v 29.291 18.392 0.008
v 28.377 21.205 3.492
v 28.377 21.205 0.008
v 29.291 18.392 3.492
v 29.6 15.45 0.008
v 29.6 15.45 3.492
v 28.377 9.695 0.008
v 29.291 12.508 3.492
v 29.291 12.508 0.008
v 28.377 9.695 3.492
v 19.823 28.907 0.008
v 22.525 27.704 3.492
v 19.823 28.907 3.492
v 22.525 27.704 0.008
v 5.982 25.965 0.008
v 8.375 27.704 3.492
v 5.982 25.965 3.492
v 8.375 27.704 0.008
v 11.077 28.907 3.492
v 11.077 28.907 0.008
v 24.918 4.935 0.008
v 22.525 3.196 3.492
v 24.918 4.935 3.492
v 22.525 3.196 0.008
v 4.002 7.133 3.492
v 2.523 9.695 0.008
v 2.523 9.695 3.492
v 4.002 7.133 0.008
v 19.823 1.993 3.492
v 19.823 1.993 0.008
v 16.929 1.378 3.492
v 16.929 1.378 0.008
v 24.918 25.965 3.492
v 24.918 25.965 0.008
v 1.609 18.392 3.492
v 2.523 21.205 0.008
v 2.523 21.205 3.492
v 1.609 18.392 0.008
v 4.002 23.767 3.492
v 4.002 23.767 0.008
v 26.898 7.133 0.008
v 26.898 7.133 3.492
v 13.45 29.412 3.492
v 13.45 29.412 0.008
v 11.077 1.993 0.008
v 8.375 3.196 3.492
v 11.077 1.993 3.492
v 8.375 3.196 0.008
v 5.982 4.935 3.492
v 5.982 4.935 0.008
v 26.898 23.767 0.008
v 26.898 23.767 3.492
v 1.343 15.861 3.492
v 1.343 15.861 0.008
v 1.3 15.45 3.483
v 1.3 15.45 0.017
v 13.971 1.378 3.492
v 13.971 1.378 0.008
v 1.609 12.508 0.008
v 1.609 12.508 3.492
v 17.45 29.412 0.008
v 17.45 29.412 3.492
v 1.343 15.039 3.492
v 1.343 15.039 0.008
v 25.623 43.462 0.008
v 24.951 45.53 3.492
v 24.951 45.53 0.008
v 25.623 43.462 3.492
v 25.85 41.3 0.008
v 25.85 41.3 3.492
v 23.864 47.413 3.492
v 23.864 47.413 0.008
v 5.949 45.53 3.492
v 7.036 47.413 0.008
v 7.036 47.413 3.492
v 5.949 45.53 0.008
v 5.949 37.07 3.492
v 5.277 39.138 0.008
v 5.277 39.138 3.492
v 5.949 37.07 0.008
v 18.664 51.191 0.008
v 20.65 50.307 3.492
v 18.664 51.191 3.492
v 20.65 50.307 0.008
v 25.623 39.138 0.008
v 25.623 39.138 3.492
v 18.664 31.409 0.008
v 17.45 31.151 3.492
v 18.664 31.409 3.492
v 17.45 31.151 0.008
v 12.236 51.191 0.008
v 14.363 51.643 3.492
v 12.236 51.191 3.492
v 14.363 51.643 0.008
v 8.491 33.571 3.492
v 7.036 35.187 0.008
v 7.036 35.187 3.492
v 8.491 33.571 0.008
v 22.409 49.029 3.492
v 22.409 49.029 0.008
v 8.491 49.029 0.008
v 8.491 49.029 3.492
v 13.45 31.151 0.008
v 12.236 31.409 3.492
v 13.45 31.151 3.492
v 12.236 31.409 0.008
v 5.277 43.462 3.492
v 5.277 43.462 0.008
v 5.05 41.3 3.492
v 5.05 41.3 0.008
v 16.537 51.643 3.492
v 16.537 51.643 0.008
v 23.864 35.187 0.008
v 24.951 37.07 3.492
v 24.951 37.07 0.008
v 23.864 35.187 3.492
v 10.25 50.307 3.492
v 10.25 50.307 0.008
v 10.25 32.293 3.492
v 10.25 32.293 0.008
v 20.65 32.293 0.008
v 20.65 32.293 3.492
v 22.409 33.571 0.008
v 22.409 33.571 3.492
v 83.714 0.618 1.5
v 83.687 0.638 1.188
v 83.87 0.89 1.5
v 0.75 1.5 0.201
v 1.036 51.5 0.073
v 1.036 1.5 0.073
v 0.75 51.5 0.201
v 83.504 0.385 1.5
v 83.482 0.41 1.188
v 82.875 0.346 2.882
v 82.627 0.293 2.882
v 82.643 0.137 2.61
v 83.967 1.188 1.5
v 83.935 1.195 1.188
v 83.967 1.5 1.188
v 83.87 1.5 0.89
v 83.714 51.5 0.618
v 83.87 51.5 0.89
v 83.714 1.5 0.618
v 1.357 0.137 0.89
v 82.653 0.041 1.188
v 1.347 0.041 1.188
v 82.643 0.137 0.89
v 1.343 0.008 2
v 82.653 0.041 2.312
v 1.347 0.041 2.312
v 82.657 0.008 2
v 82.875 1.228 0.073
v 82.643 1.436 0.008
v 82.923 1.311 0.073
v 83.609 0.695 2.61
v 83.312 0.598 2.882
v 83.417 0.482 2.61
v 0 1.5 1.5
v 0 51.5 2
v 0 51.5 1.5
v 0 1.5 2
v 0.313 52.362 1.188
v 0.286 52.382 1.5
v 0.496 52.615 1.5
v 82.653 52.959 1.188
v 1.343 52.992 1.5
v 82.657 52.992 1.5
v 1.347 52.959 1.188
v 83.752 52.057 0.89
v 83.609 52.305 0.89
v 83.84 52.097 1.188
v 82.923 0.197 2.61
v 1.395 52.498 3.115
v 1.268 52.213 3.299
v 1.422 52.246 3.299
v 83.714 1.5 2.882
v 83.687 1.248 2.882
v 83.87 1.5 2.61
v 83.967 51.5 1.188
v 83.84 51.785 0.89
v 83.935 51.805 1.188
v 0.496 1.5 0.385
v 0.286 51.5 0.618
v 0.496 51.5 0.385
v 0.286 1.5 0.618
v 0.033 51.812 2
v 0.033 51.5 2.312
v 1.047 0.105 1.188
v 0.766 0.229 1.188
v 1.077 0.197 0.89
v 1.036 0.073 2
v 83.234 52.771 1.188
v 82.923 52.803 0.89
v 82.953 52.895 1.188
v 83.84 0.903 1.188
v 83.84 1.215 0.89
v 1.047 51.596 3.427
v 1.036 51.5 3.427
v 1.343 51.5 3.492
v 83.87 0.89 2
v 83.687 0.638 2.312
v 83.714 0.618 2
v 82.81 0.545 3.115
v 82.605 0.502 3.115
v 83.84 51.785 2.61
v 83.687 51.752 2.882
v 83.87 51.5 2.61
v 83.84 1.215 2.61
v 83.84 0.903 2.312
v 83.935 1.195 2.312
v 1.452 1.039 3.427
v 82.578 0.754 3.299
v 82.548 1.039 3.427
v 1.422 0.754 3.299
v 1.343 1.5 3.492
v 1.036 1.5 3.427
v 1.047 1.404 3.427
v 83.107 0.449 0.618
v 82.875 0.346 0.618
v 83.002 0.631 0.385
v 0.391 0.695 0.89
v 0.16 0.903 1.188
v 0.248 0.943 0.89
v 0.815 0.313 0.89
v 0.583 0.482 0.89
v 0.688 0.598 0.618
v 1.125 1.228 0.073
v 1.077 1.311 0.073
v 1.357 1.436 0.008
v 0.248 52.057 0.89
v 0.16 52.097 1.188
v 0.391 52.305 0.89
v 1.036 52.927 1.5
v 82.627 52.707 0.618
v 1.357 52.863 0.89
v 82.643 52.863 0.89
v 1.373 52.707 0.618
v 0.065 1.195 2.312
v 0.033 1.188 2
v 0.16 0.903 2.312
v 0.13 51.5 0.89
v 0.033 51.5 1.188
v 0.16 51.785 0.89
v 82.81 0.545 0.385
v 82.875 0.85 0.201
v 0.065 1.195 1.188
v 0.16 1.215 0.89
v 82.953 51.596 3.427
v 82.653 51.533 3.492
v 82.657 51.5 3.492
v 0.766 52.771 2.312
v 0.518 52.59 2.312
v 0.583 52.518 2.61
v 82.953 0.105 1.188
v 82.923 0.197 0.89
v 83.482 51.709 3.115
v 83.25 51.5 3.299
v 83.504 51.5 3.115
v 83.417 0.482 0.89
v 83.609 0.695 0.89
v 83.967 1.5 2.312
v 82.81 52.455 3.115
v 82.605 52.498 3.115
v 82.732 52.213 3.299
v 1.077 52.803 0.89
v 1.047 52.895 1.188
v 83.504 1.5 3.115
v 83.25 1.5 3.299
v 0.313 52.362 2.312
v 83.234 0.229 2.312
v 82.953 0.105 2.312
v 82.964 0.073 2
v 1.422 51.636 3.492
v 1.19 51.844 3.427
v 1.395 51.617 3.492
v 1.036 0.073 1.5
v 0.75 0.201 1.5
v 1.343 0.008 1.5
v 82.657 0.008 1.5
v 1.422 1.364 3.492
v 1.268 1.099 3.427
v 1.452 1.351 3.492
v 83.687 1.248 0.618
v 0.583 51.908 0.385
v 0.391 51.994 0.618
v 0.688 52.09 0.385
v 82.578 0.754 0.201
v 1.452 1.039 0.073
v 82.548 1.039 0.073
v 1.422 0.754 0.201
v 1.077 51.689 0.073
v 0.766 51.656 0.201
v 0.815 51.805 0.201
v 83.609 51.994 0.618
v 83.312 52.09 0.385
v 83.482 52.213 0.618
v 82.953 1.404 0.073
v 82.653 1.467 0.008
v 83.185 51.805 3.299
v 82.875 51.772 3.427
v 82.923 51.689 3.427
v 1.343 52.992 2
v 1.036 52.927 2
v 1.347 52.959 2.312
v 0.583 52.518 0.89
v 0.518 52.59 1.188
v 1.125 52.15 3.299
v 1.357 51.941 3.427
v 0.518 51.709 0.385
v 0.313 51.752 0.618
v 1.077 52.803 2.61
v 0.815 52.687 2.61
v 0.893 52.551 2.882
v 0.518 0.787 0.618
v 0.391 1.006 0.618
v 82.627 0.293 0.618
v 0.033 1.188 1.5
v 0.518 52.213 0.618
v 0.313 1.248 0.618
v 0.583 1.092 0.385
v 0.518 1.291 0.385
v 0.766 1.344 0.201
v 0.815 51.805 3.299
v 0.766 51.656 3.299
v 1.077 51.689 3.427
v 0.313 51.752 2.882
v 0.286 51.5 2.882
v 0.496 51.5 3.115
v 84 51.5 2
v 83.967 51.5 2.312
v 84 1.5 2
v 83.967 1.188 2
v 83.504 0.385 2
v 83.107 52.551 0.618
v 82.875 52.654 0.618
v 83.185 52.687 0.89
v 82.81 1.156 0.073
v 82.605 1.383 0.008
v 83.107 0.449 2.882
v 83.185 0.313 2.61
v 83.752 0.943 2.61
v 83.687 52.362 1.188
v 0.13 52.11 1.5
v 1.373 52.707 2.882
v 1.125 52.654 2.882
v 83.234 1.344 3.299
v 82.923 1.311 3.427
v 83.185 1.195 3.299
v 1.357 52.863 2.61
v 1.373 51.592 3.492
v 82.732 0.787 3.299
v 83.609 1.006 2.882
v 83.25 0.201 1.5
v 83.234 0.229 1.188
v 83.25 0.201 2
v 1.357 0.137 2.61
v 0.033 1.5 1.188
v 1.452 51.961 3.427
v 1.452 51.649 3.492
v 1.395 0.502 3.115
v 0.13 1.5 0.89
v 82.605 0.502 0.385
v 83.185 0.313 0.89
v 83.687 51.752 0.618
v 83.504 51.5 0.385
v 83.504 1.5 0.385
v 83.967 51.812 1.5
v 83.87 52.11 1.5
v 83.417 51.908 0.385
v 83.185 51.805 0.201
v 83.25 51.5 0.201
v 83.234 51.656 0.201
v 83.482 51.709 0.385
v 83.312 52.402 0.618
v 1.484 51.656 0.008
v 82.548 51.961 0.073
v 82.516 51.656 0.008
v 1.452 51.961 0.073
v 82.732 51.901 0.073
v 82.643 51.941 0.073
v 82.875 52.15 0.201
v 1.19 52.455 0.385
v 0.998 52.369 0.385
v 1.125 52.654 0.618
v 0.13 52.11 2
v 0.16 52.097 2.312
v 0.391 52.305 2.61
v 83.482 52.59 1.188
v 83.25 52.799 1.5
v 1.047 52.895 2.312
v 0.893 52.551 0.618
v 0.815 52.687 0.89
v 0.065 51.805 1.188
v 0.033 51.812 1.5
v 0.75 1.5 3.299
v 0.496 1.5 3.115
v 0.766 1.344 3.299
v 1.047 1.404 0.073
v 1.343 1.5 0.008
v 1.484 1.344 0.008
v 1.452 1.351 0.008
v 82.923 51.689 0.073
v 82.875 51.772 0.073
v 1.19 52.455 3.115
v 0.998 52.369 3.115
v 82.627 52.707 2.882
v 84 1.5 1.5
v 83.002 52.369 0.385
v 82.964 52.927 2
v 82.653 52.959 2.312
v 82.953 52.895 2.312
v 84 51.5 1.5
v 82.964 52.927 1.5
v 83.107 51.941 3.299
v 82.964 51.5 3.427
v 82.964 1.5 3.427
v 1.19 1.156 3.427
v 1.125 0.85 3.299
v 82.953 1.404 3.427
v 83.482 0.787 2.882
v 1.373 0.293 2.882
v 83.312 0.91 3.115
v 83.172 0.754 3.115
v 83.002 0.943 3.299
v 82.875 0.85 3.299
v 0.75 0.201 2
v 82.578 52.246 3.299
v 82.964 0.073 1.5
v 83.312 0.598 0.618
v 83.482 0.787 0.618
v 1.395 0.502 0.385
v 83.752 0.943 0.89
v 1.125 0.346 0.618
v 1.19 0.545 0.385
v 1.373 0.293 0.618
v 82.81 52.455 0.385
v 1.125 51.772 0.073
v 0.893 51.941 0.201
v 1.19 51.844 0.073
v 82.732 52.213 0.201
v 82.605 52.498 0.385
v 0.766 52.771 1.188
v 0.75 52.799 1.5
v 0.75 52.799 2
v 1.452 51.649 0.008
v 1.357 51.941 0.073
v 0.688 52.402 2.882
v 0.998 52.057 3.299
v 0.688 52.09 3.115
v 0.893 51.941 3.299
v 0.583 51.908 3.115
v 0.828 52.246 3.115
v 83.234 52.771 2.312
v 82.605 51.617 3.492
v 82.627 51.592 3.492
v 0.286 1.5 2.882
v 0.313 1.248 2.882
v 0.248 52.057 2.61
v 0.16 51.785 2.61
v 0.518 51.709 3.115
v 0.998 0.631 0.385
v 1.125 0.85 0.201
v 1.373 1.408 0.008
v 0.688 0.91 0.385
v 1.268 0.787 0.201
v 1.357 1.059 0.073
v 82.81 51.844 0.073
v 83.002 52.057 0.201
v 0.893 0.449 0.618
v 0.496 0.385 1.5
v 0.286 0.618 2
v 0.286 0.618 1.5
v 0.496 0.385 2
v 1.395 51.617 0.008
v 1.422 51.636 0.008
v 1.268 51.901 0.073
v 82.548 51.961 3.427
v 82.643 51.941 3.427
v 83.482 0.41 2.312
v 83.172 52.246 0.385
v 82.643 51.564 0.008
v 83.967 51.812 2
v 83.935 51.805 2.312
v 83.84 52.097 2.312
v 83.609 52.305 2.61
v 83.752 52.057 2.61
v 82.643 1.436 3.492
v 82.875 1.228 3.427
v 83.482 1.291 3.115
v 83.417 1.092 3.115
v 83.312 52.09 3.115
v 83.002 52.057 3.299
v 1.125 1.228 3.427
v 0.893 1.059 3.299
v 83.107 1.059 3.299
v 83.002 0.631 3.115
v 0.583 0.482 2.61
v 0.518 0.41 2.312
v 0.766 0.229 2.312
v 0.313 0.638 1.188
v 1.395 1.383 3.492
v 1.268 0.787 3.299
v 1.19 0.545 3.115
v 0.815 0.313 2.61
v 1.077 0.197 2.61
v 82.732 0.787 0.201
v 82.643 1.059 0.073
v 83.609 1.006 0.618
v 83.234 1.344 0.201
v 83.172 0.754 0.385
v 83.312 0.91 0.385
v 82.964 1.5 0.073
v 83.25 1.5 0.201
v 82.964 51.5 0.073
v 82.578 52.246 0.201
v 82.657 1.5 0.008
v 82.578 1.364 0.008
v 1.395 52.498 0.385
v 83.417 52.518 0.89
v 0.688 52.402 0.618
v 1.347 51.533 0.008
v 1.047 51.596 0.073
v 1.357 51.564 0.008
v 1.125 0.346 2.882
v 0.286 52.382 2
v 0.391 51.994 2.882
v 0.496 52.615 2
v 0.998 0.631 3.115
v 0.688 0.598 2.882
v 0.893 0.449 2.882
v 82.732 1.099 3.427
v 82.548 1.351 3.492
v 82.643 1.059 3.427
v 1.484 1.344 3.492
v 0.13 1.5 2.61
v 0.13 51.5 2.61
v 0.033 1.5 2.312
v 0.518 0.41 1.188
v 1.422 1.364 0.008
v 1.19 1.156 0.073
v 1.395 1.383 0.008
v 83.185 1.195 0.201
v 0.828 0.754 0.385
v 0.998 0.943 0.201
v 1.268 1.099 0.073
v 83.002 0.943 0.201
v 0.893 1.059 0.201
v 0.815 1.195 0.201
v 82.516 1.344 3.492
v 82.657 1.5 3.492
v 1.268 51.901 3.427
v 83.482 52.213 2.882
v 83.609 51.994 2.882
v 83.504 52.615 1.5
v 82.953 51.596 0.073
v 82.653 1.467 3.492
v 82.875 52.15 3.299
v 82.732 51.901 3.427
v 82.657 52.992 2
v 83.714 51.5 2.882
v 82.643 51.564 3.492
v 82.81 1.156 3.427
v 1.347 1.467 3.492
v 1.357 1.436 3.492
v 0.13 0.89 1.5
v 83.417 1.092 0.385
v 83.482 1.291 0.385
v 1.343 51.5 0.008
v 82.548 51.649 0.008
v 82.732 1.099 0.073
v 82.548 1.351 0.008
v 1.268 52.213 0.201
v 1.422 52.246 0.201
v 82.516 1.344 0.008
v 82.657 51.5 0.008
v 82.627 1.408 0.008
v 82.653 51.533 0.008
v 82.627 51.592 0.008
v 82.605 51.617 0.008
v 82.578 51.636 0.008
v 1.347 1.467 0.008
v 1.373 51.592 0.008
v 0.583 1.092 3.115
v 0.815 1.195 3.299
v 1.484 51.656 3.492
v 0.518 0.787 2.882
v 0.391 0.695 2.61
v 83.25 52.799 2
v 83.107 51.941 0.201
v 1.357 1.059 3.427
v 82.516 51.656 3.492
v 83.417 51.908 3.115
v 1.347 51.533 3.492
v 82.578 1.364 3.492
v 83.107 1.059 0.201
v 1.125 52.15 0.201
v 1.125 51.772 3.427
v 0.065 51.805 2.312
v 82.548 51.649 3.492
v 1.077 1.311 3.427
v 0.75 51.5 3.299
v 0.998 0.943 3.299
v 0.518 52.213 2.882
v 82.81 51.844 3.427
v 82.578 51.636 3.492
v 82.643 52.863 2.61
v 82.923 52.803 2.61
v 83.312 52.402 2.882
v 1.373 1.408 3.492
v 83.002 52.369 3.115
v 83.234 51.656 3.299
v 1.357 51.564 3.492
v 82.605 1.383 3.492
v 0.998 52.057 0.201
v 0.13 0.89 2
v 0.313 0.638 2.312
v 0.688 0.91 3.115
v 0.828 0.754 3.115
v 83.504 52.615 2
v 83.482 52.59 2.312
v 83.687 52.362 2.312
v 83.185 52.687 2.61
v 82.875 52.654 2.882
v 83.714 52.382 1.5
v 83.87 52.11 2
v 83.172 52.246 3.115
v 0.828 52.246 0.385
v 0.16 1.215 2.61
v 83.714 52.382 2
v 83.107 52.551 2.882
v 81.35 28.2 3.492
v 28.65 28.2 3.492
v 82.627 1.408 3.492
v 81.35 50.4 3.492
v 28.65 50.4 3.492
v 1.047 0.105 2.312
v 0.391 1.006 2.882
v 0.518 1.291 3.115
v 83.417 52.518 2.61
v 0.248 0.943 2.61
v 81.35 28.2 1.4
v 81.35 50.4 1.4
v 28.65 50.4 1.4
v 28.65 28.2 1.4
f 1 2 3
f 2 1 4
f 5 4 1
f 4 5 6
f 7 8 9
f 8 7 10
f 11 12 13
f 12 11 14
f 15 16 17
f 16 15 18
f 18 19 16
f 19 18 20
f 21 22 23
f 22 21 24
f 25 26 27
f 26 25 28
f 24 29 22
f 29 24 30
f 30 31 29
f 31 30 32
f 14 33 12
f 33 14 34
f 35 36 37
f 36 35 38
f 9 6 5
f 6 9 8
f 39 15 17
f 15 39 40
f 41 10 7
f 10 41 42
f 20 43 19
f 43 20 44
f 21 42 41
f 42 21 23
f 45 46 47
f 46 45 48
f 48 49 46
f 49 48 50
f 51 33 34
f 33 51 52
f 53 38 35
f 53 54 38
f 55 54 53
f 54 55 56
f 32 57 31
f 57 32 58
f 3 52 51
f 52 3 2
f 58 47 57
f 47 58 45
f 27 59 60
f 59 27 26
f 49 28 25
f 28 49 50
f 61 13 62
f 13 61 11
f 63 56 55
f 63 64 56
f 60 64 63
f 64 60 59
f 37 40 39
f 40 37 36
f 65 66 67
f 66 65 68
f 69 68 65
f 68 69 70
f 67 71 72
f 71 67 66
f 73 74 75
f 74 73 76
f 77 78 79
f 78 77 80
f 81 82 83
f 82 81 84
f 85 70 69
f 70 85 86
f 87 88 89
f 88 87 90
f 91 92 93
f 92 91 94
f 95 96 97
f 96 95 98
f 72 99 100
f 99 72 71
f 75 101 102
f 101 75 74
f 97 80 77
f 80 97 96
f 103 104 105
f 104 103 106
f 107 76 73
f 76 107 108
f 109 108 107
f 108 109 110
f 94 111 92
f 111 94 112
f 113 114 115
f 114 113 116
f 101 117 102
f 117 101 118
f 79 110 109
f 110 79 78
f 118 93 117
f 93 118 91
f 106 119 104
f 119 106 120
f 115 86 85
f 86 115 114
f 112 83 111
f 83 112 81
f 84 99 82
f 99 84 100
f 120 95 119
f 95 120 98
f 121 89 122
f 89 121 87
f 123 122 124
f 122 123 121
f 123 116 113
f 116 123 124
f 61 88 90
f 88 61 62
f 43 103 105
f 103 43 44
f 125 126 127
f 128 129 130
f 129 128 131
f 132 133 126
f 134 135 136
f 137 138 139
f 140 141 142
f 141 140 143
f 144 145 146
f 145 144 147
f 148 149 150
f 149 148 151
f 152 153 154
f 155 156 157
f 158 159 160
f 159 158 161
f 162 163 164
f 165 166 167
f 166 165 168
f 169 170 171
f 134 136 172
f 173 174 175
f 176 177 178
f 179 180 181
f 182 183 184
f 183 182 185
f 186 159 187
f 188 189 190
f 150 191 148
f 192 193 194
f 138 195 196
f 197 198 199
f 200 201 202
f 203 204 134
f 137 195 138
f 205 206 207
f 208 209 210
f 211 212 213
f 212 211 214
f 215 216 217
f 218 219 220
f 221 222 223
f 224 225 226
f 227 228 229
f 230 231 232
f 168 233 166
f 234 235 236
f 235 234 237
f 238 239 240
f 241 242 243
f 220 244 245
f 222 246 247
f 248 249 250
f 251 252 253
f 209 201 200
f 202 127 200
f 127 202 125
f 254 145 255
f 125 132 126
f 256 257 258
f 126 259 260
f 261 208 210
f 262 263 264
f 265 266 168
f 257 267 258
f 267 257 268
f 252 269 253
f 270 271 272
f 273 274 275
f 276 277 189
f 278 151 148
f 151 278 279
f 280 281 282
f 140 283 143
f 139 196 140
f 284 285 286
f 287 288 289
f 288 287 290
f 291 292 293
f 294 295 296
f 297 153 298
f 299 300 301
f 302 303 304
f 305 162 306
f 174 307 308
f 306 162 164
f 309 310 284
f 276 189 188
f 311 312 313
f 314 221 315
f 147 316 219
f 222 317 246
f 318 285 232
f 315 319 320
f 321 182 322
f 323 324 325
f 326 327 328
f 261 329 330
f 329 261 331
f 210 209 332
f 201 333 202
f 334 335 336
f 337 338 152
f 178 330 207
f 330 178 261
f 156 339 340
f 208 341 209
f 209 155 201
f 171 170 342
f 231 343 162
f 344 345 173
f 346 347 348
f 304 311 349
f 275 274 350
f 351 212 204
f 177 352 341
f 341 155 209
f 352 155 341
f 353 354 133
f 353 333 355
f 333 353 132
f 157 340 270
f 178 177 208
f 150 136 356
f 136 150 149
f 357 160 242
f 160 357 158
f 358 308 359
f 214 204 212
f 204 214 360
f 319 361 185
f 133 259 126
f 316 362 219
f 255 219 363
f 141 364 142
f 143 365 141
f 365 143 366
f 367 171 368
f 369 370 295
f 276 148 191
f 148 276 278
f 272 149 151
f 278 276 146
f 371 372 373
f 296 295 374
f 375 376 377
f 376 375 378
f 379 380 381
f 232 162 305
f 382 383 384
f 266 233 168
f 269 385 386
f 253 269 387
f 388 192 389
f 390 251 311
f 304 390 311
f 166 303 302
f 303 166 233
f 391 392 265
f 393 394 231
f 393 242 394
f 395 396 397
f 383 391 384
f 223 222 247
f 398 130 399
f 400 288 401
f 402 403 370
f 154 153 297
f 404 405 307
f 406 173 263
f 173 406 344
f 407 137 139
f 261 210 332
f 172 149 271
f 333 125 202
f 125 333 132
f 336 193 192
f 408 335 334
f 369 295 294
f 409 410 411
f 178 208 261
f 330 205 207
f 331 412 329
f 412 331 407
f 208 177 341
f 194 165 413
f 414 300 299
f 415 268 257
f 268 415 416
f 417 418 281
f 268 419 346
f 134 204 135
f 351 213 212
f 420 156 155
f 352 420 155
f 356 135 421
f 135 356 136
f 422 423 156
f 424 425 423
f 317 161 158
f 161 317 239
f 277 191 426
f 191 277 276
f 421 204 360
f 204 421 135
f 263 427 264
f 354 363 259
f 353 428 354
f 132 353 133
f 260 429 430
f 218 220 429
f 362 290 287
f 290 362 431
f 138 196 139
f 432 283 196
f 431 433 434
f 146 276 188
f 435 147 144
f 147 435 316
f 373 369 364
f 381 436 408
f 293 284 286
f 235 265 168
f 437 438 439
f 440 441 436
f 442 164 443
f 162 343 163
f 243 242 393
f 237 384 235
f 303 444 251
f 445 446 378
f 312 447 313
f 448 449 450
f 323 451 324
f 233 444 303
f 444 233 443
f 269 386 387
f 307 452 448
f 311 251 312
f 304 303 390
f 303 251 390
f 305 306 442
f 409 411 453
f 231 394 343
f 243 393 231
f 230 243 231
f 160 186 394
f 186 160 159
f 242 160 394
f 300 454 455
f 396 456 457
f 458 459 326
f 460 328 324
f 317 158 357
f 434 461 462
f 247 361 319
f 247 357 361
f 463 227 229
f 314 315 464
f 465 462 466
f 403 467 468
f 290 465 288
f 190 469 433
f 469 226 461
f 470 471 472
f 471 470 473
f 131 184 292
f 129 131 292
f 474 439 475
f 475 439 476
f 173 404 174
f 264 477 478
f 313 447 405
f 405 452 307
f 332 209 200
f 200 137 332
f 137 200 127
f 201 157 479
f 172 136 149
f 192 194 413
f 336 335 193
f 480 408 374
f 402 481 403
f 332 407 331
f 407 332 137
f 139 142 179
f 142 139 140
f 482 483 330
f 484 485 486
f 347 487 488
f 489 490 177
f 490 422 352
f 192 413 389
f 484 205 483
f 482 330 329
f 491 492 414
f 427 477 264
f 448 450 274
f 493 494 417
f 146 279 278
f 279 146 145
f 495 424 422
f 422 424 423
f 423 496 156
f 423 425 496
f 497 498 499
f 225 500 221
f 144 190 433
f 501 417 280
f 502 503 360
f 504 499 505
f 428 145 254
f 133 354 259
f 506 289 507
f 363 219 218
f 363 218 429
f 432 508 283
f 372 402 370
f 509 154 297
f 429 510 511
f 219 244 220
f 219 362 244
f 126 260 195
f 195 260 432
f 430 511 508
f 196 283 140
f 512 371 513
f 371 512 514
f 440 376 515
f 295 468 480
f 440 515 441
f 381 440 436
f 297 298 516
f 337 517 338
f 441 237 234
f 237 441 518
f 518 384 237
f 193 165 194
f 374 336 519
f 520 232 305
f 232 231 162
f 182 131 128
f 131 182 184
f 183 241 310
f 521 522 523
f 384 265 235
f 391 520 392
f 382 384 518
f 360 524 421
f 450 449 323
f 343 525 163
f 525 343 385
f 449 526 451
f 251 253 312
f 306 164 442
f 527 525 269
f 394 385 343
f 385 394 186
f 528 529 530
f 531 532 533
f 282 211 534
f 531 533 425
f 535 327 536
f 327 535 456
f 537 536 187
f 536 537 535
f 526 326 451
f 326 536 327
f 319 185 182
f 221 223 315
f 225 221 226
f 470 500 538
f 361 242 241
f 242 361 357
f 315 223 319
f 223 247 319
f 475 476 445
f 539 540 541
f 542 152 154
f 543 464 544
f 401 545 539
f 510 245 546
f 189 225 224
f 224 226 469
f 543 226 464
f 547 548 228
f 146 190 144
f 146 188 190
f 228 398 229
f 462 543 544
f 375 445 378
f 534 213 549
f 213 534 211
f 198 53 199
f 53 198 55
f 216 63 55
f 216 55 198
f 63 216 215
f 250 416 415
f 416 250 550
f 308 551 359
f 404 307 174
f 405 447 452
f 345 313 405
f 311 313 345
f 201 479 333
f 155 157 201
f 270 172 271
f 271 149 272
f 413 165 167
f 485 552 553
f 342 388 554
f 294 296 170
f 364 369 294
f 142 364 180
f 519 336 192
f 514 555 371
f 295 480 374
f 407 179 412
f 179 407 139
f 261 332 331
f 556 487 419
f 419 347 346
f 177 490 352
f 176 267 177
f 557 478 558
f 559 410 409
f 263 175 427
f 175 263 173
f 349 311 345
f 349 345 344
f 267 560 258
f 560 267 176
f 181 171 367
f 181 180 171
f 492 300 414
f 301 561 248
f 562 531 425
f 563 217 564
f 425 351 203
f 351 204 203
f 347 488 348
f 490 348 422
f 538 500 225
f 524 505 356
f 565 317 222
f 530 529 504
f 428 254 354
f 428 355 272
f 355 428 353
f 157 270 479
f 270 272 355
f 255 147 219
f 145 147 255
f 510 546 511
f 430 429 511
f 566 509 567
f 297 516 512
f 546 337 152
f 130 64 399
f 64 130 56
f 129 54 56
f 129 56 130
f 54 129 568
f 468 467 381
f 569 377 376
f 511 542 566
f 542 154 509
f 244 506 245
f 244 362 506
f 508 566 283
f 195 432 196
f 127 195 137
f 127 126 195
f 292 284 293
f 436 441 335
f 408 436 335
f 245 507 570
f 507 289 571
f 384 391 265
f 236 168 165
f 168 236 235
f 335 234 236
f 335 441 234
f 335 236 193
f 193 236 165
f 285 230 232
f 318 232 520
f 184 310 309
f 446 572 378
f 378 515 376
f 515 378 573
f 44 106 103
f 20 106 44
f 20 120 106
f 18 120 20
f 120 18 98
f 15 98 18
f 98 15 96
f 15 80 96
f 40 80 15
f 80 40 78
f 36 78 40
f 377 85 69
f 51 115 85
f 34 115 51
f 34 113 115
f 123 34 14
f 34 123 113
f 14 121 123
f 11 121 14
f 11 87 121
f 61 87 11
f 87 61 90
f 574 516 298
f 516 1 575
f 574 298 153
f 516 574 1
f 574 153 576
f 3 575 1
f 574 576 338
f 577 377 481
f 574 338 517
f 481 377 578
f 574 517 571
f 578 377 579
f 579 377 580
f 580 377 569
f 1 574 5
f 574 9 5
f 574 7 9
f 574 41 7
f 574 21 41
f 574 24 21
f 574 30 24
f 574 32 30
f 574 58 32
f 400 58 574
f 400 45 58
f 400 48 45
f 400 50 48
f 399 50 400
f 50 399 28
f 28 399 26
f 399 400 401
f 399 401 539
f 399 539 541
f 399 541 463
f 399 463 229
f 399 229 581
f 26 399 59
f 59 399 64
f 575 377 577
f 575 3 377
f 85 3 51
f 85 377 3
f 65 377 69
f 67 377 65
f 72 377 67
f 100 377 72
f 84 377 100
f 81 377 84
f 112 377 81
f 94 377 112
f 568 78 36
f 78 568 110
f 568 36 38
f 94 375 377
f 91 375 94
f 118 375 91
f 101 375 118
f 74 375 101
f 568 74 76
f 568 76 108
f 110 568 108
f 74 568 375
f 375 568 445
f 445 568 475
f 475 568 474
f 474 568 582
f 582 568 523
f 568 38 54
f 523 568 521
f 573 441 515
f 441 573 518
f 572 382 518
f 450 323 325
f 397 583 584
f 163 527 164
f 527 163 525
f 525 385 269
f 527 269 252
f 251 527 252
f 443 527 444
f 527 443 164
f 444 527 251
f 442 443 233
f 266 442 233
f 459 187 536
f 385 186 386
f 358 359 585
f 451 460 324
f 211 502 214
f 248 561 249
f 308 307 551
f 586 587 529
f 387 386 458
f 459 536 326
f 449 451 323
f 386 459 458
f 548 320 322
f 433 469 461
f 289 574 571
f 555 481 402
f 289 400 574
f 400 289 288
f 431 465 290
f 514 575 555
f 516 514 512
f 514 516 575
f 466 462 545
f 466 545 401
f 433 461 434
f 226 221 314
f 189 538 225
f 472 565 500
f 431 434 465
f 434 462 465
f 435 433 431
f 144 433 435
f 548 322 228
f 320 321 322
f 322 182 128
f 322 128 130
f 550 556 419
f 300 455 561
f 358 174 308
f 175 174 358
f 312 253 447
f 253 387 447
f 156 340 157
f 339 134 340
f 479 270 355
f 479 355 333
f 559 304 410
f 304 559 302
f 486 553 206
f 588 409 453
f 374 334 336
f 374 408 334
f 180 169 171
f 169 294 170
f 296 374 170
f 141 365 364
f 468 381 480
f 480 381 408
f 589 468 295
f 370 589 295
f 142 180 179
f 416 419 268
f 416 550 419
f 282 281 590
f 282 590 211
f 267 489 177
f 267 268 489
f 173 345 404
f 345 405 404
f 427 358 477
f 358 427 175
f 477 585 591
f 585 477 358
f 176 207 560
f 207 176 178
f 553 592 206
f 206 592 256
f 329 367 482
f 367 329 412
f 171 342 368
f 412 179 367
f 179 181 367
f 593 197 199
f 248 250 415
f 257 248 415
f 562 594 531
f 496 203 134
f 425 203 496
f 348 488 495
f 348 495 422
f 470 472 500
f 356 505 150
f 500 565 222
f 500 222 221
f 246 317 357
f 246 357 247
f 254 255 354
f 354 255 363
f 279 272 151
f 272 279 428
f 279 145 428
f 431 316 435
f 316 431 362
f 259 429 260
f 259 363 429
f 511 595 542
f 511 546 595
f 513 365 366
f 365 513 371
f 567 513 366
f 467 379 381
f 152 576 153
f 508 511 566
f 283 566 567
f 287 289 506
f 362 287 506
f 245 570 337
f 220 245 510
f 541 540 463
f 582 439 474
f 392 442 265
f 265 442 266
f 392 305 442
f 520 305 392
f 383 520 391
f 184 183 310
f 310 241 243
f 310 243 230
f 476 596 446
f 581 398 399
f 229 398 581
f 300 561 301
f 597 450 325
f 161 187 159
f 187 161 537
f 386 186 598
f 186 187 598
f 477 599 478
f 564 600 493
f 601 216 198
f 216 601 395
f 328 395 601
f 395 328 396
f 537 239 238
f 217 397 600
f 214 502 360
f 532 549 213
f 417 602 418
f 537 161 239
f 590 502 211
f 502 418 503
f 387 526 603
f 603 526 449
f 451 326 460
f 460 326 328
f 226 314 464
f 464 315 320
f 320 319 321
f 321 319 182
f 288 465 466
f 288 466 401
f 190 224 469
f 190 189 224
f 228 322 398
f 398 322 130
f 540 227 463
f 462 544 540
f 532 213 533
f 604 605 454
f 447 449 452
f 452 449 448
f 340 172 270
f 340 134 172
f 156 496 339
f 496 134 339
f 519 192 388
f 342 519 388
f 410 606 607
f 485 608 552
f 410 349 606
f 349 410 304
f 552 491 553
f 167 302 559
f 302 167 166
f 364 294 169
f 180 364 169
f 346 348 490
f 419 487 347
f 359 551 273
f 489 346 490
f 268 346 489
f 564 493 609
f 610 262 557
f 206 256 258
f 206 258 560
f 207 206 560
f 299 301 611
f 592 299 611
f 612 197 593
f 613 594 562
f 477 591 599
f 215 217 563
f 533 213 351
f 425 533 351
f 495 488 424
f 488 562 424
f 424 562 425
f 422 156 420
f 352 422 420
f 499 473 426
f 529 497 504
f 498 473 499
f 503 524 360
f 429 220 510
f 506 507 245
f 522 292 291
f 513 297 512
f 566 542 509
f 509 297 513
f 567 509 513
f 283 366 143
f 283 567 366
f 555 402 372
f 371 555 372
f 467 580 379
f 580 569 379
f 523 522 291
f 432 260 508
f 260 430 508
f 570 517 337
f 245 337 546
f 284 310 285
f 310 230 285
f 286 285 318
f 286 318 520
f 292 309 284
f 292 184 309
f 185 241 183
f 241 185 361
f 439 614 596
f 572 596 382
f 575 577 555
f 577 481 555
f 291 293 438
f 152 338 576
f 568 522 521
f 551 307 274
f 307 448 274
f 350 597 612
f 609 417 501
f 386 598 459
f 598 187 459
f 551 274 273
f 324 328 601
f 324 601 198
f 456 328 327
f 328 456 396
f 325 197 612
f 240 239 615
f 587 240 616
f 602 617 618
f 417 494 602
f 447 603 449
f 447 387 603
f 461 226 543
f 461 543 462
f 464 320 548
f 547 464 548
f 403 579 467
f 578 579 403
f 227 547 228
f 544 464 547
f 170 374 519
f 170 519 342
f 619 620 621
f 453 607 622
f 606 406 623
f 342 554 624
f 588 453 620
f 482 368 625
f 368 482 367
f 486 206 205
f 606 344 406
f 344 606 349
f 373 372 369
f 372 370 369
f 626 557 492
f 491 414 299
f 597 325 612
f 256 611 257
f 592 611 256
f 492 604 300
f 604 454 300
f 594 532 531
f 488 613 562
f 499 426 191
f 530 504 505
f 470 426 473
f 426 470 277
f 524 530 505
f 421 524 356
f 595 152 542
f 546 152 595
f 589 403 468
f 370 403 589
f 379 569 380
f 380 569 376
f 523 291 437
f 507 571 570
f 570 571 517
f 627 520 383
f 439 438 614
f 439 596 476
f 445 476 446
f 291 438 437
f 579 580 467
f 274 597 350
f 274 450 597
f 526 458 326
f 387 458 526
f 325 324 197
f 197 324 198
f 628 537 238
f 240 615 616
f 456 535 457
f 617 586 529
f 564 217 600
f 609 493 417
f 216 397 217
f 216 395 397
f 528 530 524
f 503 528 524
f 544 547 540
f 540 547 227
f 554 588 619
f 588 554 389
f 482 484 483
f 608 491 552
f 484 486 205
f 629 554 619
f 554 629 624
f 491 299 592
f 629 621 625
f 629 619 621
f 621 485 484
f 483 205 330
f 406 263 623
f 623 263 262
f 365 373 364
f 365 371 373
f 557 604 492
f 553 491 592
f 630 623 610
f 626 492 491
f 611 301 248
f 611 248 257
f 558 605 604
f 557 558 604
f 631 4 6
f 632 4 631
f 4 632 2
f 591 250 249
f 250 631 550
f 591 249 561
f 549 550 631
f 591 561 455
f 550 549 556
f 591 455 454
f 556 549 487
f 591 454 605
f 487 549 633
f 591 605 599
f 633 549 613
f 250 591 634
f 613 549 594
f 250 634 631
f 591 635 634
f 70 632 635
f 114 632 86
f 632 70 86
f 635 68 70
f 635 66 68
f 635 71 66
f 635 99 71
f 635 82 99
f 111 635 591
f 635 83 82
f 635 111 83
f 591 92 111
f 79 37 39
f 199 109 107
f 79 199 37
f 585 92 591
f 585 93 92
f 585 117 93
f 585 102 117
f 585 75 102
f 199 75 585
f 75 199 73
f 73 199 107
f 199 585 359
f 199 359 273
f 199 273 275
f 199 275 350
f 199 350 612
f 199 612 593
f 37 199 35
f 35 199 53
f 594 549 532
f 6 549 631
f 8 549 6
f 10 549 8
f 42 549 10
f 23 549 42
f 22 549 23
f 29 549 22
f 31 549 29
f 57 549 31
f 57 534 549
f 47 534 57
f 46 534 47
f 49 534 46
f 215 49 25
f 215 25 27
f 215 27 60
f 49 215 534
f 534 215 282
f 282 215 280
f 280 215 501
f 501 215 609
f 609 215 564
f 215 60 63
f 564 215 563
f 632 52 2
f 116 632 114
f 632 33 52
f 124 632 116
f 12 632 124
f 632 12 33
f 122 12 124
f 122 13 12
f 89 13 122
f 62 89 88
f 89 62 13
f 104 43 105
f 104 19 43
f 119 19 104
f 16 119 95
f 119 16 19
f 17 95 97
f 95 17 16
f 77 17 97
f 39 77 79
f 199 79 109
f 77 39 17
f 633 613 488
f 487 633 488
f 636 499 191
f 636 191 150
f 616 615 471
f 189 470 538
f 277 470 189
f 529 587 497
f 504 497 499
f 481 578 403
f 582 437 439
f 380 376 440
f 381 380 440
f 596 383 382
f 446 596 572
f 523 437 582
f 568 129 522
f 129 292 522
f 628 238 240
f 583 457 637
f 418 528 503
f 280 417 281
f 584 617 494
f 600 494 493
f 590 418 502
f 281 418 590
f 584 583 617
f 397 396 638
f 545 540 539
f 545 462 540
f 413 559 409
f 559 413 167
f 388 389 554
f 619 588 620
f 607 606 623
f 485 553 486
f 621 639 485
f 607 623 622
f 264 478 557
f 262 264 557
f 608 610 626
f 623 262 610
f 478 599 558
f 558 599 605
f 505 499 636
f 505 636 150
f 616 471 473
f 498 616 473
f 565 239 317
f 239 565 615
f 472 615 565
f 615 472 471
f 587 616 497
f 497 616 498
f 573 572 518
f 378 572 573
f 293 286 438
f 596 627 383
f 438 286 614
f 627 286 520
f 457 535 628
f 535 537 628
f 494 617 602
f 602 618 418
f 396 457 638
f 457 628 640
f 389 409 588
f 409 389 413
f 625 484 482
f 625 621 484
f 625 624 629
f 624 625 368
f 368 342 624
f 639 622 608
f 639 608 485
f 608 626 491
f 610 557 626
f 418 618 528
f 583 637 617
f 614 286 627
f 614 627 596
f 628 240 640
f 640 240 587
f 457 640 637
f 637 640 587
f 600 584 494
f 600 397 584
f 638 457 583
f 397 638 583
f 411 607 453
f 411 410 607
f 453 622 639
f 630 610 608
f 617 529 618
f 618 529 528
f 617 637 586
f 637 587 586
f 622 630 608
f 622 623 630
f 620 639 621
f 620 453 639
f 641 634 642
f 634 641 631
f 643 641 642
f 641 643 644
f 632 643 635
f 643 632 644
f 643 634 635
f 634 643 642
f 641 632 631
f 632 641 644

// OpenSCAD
// file: support/roundedcube.scad
// More information: https://danielupshaw.com/openscad-rounded-corners/
// License 2020-08-13: The only two people in this world who are allowed to use roundedcube.scad are named Dan Upshaw and Dan Fandrich

// Set to 0.01 for higher definition curves (renders slower)
$fs = 0.15;

module roundedcube(size = [1, 1, 1], center = false, radius = 0.5, apply_to = "all") {
	// If single value, convert to [x, y, z] vector
	size = (size[0] == undef) ? [size, size, size] : size;

	translate_min = radius;
	translate_xmax = size[0] - radius;
	translate_ymax = size[1] - radius;
	translate_zmax = size[2] - radius;

	diameter = radius * 2;

	obj_translate = (center == false) ?
		[0, 0, 0] : [
			-(size[0] / 2),
			-(size[1] / 2),
			-(size[2] / 2)
		];

	translate(v = obj_translate) {
		hull() {
			for (translate_x = [translate_min, translate_xmax]) {
				x_at = (translate_x == translate_min) ? "min" : "max";
				for (translate_y = [translate_min, translate_ymax]) {
					y_at = (translate_y == translate_min) ? "min" : "max";
					for (translate_z = [translate_min, translate_zmax]) {
						z_at = (translate_z == translate_min) ? "min" : "max";

						translate(v = [translate_x, translate_y, translate_z])
						if (
							(apply_to == "all") ||
							(apply_to == "xmin" && x_at == "min") || (apply_to == "xmax" && x_at == "max") ||
							(apply_to == "ymin" && y_at == "min") || (apply_to == "ymax" && y_at == "max") ||
							(apply_to == "zmin" && z_at == "min") || (apply_to == "zmax" && z_at == "max")
						) {
							sphere(r = radius);
						} else {
							rotate =
								(apply_to == "xmin" || apply_to == "xmax" || apply_to == "x") ? [0, 90, 0] : (
								(apply_to == "ymin" || apply_to == "ymax" || apply_to == "y") ? [90, 90, 0] :
								[0, 0, 0]
							);
							rotate(a = rotate)
							cylinder(h = diameter, r = radius, center = true);
						}
					}
				}
			}
		}
	}
}
// main file
include <support/roundedcube.scad>

rerr = 0.01;

t = 0.2;
t2 = t*2;

card_w = 85 - 1;
card_d = 54 - 1;
card_h = 3.5;

key_w = 52.3 + t2;
key_d = 21.8 + t2;
key_h = 2.1;

tag_r = 27.5/2 + t2;
battery_r = 20/2 + t2;

justify_spacing = (card_d - battery_r*2 - tag_r*2)/3;

difference() {
  roundedcube([card_w, card_d, card_h], radius=1.5);

  translate([justify_spacing + tag_r, justify_spacing + tag_r, -1]) {
    cylinder(r=tag_r, h=5);

    translate([0, tag_r + justify_spacing + battery_r, 0])
    cylinder(r=battery_r, h=5);

    // Wire path
    translate([-2, 3, -rerr])
    cube([4, justify_spacing + tag_r, 5]);
  }

  translate([tag_r + battery_r + justify_spacing*2 + 1.5, card_d - key_d - justify_spacing*2, card_h - key_h])
  cube([key_w, key_d, key_h + rerr]);
}
